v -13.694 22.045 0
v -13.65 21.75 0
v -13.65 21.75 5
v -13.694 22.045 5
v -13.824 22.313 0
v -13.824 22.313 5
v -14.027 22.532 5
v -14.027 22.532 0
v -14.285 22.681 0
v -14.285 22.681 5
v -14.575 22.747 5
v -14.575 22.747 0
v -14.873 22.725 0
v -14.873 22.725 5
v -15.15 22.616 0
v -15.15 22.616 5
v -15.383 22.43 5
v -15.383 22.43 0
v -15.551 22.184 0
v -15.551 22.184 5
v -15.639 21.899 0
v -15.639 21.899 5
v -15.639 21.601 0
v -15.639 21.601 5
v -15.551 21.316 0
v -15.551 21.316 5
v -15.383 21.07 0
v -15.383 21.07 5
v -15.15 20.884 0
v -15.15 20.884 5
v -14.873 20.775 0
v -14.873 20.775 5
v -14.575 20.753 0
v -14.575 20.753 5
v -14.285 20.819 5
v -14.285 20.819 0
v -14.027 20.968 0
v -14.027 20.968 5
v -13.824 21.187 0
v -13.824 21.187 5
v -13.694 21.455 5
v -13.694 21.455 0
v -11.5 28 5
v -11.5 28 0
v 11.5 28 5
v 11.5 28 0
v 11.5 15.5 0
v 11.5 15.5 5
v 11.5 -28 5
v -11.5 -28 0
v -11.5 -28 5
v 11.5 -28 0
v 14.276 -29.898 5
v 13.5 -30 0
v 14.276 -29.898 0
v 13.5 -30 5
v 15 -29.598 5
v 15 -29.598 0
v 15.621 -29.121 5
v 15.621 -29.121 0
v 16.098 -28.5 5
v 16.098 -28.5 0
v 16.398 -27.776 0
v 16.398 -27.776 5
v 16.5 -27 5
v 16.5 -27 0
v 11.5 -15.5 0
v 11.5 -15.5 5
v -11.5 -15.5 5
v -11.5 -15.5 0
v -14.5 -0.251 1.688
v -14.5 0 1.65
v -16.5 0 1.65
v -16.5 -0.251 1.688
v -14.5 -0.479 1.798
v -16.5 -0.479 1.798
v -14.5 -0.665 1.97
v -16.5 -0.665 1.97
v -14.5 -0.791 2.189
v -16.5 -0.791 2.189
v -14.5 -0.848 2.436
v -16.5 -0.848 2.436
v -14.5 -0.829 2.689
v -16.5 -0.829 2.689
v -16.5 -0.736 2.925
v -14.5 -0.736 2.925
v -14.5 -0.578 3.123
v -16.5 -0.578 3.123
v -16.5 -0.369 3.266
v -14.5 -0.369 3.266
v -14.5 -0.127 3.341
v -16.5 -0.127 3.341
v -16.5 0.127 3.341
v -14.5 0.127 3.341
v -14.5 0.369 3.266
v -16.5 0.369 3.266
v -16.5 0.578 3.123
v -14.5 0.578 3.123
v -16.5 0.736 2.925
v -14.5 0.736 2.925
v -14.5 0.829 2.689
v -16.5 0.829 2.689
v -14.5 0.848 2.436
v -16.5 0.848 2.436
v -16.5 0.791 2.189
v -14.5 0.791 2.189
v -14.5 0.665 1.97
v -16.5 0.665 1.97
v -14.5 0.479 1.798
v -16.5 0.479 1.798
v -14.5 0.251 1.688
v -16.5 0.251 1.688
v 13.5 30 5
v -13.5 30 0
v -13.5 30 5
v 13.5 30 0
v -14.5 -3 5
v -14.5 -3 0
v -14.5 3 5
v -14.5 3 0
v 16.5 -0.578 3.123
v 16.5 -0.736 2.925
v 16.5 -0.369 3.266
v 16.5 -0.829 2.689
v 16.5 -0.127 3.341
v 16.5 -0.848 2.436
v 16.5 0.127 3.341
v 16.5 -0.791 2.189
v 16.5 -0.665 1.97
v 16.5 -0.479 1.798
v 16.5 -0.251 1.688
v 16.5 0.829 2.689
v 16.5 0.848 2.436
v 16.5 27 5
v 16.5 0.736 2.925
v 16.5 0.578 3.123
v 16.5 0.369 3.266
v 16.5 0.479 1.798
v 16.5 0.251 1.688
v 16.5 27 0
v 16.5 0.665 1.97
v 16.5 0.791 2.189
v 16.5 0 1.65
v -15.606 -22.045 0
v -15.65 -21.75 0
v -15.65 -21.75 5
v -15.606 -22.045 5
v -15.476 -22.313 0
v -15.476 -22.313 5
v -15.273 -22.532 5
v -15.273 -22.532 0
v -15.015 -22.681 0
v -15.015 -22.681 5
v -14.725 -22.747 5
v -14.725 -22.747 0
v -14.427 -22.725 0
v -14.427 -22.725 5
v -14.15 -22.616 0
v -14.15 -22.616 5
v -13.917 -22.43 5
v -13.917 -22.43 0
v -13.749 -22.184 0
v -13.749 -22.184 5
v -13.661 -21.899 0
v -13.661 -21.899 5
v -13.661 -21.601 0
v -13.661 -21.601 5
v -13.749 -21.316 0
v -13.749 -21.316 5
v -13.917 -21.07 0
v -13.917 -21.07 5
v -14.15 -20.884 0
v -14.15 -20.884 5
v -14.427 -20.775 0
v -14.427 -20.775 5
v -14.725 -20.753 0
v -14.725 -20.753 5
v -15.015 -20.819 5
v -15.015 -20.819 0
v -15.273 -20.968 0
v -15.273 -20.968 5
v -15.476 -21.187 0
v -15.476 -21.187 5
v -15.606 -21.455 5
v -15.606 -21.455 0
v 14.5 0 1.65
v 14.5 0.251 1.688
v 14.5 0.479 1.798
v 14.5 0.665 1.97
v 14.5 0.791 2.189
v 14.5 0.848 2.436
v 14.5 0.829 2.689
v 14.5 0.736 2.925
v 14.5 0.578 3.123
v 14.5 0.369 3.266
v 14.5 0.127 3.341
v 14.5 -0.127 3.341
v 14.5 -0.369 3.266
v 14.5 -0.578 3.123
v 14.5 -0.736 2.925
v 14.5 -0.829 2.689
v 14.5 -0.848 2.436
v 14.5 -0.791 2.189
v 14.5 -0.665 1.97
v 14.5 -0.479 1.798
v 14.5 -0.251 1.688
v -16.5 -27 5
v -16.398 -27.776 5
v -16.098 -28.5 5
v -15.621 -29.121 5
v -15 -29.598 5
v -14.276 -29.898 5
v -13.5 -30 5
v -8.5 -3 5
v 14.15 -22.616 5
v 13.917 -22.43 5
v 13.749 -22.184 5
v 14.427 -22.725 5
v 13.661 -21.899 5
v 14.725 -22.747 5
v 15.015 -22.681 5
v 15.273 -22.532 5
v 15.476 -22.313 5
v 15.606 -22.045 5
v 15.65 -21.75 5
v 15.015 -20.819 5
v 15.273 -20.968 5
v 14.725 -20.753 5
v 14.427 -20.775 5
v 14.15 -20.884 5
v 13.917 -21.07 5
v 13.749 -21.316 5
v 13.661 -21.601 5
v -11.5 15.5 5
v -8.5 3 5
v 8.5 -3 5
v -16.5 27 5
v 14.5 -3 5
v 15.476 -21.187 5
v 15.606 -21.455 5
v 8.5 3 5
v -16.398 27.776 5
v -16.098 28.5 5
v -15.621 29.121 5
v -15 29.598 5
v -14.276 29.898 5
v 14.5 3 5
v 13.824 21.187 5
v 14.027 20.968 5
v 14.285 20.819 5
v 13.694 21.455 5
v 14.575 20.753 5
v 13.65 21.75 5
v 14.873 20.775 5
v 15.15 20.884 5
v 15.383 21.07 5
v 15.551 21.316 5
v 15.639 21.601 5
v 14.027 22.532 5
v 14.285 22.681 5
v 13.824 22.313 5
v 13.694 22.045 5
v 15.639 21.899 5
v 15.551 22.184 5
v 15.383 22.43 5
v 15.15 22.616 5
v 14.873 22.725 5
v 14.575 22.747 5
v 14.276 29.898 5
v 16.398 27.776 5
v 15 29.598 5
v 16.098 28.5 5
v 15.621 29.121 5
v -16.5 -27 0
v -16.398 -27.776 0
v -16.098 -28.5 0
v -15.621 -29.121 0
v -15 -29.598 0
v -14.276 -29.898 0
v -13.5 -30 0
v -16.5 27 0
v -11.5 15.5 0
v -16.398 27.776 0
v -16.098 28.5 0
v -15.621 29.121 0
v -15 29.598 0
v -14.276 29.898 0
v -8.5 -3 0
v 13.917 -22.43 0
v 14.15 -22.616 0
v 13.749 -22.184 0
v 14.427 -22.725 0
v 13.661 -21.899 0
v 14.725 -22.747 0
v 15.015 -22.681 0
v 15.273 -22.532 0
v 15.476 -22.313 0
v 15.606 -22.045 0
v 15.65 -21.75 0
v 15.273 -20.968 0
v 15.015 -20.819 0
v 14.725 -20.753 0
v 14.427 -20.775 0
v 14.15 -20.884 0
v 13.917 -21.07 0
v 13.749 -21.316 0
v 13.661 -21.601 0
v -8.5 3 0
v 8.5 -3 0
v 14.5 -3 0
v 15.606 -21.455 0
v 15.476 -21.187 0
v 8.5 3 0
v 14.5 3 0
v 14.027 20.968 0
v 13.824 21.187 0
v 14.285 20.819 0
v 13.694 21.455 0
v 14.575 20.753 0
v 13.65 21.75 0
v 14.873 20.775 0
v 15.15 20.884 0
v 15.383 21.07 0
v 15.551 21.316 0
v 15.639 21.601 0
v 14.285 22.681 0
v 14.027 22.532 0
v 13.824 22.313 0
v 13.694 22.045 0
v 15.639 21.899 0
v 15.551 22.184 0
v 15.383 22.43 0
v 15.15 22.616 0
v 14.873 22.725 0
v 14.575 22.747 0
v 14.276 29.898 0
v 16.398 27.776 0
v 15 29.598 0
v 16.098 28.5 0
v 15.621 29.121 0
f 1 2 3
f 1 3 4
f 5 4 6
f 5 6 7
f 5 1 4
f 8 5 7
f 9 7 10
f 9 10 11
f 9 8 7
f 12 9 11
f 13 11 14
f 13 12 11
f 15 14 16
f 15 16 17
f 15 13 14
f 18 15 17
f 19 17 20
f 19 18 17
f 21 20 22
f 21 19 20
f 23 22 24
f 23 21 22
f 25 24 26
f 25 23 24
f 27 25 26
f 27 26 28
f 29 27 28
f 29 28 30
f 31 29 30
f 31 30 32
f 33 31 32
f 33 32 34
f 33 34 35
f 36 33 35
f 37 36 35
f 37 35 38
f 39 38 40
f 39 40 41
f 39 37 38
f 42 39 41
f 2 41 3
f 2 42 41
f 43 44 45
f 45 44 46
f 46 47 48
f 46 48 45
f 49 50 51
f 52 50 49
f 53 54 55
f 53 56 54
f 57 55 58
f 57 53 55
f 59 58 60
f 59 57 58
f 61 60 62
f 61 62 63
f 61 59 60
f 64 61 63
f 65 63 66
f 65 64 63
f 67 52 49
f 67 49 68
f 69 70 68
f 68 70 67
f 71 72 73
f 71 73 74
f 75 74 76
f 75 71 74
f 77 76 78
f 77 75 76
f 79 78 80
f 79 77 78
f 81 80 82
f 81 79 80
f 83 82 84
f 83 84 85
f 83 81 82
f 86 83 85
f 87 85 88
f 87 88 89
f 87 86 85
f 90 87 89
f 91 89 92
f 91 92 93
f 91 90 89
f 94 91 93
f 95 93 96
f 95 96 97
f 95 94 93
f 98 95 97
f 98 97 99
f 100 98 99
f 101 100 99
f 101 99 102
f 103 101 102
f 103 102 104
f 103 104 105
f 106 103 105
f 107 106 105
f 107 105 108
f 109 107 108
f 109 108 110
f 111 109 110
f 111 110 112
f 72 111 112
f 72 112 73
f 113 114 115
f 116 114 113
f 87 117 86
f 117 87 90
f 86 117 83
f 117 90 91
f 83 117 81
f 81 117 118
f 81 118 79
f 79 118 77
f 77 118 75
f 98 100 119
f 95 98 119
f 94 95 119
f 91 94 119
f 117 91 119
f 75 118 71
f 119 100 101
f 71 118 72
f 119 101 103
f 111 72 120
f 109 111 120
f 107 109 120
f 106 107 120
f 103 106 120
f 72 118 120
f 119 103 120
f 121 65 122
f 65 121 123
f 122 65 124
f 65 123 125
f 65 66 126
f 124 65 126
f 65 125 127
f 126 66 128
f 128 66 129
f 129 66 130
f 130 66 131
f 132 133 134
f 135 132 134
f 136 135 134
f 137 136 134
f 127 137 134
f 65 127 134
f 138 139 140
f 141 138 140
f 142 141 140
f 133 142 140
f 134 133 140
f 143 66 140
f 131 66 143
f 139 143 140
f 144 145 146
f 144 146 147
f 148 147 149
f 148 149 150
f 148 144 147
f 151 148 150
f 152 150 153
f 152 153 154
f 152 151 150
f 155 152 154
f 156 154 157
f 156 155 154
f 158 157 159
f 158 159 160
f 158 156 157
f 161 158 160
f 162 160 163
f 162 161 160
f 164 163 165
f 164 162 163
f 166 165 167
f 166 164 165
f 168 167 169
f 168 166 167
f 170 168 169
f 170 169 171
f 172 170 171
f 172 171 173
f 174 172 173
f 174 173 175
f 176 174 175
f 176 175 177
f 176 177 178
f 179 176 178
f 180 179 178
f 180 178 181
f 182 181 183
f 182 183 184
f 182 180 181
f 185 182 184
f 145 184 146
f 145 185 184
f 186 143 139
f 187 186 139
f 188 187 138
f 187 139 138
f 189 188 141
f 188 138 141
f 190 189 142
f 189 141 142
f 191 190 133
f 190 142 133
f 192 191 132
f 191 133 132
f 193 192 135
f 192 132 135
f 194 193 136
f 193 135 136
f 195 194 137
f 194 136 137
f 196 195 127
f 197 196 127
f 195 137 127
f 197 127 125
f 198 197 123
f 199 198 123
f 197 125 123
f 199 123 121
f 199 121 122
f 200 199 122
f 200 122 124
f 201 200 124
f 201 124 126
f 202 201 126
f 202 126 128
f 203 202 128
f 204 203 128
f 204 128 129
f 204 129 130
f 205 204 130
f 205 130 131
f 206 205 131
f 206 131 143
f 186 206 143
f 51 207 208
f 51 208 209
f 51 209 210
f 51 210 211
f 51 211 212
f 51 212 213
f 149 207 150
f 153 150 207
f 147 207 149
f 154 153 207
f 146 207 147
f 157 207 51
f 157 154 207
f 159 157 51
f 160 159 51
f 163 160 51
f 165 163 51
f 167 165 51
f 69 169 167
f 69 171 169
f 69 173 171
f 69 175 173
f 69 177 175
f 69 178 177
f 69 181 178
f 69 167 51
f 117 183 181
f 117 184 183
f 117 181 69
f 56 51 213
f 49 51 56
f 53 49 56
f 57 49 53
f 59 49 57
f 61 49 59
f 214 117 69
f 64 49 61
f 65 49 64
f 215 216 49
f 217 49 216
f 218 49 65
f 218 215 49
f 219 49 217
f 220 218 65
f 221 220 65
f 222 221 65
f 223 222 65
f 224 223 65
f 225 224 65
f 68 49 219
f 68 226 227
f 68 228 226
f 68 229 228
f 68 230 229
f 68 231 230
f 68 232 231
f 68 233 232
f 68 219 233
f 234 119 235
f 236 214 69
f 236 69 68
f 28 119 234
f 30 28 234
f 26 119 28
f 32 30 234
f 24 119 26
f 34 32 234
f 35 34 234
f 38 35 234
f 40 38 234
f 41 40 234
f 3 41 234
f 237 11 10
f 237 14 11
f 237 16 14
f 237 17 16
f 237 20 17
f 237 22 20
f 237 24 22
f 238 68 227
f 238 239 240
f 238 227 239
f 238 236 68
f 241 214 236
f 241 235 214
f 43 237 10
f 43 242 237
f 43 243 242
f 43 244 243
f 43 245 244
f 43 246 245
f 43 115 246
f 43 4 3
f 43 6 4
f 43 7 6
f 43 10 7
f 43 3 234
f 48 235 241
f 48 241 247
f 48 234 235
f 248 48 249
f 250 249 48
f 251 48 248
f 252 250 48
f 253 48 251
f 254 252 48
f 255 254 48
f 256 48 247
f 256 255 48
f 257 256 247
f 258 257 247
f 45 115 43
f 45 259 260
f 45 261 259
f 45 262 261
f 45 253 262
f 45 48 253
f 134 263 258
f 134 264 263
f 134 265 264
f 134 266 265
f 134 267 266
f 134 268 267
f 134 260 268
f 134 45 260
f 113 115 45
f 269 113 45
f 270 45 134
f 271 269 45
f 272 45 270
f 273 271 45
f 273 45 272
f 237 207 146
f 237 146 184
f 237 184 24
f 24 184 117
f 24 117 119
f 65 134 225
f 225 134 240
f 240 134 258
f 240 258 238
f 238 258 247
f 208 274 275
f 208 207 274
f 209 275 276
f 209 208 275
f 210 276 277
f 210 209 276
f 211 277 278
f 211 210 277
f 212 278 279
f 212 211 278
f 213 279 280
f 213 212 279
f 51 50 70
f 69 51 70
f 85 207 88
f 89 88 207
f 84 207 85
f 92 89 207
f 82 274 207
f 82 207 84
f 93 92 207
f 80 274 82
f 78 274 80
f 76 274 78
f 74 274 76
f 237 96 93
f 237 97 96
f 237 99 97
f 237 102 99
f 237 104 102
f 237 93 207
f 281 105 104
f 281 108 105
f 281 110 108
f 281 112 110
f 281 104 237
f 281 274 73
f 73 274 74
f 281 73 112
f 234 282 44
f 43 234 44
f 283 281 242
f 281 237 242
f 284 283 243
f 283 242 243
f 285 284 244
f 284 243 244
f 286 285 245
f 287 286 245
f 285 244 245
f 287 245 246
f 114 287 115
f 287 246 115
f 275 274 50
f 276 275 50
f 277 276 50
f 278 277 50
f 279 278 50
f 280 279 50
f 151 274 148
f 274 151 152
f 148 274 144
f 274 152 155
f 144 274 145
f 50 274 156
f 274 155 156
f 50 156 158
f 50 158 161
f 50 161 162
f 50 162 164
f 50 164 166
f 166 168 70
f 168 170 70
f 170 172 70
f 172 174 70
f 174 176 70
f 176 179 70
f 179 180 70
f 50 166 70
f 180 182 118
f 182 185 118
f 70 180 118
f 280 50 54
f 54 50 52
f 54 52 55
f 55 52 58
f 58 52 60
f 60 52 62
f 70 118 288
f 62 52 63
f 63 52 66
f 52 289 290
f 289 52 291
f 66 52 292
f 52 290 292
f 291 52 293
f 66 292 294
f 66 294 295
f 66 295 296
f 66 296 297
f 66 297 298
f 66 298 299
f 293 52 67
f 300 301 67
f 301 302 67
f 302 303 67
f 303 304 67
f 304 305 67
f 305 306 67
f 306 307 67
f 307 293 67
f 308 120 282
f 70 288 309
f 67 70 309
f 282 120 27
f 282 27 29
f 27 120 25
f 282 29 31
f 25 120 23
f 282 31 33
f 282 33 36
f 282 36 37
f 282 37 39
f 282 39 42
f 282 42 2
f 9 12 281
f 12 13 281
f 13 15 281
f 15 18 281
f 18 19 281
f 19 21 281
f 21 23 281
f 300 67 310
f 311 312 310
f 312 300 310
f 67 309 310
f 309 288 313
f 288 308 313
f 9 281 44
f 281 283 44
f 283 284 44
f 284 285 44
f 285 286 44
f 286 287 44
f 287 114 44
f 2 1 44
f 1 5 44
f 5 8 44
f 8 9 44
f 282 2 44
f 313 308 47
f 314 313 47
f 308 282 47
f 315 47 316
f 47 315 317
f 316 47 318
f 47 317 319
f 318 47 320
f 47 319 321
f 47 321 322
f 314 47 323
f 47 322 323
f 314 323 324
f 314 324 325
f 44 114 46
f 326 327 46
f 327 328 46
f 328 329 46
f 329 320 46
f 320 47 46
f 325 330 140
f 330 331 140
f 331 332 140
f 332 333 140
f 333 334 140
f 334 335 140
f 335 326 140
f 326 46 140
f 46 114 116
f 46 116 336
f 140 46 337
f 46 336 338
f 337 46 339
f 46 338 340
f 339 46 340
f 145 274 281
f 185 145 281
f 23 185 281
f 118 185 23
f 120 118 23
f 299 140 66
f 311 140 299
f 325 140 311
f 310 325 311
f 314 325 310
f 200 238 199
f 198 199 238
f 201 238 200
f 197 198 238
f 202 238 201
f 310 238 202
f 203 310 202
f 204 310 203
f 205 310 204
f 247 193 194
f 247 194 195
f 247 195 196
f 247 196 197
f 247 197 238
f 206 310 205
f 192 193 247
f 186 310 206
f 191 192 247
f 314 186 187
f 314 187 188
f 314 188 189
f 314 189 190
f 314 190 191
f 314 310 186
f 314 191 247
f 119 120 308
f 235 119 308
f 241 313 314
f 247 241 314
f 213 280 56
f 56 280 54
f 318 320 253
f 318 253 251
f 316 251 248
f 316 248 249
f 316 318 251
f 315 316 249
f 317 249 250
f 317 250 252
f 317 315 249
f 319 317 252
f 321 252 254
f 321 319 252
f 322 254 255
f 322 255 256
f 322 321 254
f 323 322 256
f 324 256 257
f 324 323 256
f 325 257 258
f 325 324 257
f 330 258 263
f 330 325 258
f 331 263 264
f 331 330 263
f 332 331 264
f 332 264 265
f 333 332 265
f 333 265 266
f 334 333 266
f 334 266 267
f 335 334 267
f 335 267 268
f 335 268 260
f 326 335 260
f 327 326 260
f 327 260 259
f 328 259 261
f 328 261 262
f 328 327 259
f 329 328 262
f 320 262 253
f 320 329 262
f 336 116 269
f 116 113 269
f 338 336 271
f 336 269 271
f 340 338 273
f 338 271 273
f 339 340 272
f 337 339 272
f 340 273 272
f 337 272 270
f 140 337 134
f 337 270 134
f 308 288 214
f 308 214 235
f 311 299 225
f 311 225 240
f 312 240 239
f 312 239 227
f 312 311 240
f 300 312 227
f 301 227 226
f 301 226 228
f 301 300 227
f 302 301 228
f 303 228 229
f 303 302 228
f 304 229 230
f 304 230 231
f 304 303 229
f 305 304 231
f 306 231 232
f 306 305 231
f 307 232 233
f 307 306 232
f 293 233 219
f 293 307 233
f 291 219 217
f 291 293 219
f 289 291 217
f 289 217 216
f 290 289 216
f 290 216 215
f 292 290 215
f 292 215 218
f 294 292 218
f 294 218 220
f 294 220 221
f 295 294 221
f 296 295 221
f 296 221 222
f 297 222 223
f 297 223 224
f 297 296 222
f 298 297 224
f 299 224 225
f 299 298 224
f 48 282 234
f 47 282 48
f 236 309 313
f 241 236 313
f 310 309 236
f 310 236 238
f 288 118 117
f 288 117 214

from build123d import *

# Parameters (mm, degrees)
SKETCH1_W           = 33
SKETCH1_H           = 60
SKETCH1_R           = 1
SKETCH1_W_2         = 23
SKETCH1_H_2         = 12.5
SKETCH1_W_3         = 6
SKETCH1_H_3         = 6
BOSS_EXTRUDE1_DEPTH = 5
SKETCH2_R           = 0.85
CUT_EXTRUDE1_DEPTH  = 3
CUT_EXTRUDE2_START  = -3
SKETCH3_R           = 0.85
CUT_EXTRUDE2_DEPTH  = 3
FILLET1_R           = 3


with BuildPart() as part:
    # Sketch1 → Boss-Extrude1 (new body)
    with BuildSketch(Plane.XY):
        Rectangle(SKETCH1_W, SKETCH1_H)
        with Locations((-14.65, 21.75)):
            Circle(SKETCH1_R, mode=Mode.SUBTRACT)
        with Locations(Location((14.65, 21.75, 0), (0, 0, 180))):
            Circle(SKETCH1_R, mode=Mode.SUBTRACT)
        with Locations((14.65, -21.75)):
            Circle(SKETCH1_R, mode=Mode.SUBTRACT)
        with Locations(Location((-14.65, -21.75, 0), (0, 0, 180))):
            Circle(SKETCH1_R, mode=Mode.SUBTRACT)
        with Locations((0, 21.75)):
            Rectangle(SKETCH1_W_2, SKETCH1_H_2, mode=Mode.SUBTRACT)
        with Locations((0, -21.75)):
            Rectangle(SKETCH1_W_2, SKETCH1_H_2, mode=Mode.SUBTRACT)
        with Locations((11.5, 0)):
            Rectangle(SKETCH1_W_3, SKETCH1_H_3, mode=Mode.SUBTRACT)
        with Locations((-11.5, 0)):
            Rectangle(SKETCH1_W_3, SKETCH1_H_3, mode=Mode.SUBTRACT)
    extrude(amount=BOSS_EXTRUDE1_DEPTH)

    # Sketch2 → Cut-Extrude1 (cut)
    with BuildSketch(Plane(origin=(16.5, 0, 0), x_dir=(0, 0, -1), z_dir=(1, 0, 0))):
        with Locations((-2.5, 0)):
            Circle(SKETCH2_R)
    extrude(amount=-CUT_EXTRUDE1_DEPTH, mode=Mode.SUBTRACT)

    # Sketch3 → Cut-Extrude2 (cut)
    with BuildSketch(Plane.ZY.offset(16.5).offset(CUT_EXTRUDE2_START)):
        with Locations(Location((2.5, 0, 0), (0, 0, 180))):
            Circle(SKETCH3_R)
    extrude(amount=CUT_EXTRUDE2_DEPTH, mode=Mode.SUBTRACT)

    # Fillet1
    fillet1_edges = [part.edges().sort_by_distance(p)[0] for p in [
        (16.5, -30, 2.5),
        (-16.5, -30, 2.5),
        (-16.5, 30, 2.5),
        (16.5, 30, 2.5),
    ]]
    fillet(fillet1_edges, radius=FILLET1_R)


solid = part.part
